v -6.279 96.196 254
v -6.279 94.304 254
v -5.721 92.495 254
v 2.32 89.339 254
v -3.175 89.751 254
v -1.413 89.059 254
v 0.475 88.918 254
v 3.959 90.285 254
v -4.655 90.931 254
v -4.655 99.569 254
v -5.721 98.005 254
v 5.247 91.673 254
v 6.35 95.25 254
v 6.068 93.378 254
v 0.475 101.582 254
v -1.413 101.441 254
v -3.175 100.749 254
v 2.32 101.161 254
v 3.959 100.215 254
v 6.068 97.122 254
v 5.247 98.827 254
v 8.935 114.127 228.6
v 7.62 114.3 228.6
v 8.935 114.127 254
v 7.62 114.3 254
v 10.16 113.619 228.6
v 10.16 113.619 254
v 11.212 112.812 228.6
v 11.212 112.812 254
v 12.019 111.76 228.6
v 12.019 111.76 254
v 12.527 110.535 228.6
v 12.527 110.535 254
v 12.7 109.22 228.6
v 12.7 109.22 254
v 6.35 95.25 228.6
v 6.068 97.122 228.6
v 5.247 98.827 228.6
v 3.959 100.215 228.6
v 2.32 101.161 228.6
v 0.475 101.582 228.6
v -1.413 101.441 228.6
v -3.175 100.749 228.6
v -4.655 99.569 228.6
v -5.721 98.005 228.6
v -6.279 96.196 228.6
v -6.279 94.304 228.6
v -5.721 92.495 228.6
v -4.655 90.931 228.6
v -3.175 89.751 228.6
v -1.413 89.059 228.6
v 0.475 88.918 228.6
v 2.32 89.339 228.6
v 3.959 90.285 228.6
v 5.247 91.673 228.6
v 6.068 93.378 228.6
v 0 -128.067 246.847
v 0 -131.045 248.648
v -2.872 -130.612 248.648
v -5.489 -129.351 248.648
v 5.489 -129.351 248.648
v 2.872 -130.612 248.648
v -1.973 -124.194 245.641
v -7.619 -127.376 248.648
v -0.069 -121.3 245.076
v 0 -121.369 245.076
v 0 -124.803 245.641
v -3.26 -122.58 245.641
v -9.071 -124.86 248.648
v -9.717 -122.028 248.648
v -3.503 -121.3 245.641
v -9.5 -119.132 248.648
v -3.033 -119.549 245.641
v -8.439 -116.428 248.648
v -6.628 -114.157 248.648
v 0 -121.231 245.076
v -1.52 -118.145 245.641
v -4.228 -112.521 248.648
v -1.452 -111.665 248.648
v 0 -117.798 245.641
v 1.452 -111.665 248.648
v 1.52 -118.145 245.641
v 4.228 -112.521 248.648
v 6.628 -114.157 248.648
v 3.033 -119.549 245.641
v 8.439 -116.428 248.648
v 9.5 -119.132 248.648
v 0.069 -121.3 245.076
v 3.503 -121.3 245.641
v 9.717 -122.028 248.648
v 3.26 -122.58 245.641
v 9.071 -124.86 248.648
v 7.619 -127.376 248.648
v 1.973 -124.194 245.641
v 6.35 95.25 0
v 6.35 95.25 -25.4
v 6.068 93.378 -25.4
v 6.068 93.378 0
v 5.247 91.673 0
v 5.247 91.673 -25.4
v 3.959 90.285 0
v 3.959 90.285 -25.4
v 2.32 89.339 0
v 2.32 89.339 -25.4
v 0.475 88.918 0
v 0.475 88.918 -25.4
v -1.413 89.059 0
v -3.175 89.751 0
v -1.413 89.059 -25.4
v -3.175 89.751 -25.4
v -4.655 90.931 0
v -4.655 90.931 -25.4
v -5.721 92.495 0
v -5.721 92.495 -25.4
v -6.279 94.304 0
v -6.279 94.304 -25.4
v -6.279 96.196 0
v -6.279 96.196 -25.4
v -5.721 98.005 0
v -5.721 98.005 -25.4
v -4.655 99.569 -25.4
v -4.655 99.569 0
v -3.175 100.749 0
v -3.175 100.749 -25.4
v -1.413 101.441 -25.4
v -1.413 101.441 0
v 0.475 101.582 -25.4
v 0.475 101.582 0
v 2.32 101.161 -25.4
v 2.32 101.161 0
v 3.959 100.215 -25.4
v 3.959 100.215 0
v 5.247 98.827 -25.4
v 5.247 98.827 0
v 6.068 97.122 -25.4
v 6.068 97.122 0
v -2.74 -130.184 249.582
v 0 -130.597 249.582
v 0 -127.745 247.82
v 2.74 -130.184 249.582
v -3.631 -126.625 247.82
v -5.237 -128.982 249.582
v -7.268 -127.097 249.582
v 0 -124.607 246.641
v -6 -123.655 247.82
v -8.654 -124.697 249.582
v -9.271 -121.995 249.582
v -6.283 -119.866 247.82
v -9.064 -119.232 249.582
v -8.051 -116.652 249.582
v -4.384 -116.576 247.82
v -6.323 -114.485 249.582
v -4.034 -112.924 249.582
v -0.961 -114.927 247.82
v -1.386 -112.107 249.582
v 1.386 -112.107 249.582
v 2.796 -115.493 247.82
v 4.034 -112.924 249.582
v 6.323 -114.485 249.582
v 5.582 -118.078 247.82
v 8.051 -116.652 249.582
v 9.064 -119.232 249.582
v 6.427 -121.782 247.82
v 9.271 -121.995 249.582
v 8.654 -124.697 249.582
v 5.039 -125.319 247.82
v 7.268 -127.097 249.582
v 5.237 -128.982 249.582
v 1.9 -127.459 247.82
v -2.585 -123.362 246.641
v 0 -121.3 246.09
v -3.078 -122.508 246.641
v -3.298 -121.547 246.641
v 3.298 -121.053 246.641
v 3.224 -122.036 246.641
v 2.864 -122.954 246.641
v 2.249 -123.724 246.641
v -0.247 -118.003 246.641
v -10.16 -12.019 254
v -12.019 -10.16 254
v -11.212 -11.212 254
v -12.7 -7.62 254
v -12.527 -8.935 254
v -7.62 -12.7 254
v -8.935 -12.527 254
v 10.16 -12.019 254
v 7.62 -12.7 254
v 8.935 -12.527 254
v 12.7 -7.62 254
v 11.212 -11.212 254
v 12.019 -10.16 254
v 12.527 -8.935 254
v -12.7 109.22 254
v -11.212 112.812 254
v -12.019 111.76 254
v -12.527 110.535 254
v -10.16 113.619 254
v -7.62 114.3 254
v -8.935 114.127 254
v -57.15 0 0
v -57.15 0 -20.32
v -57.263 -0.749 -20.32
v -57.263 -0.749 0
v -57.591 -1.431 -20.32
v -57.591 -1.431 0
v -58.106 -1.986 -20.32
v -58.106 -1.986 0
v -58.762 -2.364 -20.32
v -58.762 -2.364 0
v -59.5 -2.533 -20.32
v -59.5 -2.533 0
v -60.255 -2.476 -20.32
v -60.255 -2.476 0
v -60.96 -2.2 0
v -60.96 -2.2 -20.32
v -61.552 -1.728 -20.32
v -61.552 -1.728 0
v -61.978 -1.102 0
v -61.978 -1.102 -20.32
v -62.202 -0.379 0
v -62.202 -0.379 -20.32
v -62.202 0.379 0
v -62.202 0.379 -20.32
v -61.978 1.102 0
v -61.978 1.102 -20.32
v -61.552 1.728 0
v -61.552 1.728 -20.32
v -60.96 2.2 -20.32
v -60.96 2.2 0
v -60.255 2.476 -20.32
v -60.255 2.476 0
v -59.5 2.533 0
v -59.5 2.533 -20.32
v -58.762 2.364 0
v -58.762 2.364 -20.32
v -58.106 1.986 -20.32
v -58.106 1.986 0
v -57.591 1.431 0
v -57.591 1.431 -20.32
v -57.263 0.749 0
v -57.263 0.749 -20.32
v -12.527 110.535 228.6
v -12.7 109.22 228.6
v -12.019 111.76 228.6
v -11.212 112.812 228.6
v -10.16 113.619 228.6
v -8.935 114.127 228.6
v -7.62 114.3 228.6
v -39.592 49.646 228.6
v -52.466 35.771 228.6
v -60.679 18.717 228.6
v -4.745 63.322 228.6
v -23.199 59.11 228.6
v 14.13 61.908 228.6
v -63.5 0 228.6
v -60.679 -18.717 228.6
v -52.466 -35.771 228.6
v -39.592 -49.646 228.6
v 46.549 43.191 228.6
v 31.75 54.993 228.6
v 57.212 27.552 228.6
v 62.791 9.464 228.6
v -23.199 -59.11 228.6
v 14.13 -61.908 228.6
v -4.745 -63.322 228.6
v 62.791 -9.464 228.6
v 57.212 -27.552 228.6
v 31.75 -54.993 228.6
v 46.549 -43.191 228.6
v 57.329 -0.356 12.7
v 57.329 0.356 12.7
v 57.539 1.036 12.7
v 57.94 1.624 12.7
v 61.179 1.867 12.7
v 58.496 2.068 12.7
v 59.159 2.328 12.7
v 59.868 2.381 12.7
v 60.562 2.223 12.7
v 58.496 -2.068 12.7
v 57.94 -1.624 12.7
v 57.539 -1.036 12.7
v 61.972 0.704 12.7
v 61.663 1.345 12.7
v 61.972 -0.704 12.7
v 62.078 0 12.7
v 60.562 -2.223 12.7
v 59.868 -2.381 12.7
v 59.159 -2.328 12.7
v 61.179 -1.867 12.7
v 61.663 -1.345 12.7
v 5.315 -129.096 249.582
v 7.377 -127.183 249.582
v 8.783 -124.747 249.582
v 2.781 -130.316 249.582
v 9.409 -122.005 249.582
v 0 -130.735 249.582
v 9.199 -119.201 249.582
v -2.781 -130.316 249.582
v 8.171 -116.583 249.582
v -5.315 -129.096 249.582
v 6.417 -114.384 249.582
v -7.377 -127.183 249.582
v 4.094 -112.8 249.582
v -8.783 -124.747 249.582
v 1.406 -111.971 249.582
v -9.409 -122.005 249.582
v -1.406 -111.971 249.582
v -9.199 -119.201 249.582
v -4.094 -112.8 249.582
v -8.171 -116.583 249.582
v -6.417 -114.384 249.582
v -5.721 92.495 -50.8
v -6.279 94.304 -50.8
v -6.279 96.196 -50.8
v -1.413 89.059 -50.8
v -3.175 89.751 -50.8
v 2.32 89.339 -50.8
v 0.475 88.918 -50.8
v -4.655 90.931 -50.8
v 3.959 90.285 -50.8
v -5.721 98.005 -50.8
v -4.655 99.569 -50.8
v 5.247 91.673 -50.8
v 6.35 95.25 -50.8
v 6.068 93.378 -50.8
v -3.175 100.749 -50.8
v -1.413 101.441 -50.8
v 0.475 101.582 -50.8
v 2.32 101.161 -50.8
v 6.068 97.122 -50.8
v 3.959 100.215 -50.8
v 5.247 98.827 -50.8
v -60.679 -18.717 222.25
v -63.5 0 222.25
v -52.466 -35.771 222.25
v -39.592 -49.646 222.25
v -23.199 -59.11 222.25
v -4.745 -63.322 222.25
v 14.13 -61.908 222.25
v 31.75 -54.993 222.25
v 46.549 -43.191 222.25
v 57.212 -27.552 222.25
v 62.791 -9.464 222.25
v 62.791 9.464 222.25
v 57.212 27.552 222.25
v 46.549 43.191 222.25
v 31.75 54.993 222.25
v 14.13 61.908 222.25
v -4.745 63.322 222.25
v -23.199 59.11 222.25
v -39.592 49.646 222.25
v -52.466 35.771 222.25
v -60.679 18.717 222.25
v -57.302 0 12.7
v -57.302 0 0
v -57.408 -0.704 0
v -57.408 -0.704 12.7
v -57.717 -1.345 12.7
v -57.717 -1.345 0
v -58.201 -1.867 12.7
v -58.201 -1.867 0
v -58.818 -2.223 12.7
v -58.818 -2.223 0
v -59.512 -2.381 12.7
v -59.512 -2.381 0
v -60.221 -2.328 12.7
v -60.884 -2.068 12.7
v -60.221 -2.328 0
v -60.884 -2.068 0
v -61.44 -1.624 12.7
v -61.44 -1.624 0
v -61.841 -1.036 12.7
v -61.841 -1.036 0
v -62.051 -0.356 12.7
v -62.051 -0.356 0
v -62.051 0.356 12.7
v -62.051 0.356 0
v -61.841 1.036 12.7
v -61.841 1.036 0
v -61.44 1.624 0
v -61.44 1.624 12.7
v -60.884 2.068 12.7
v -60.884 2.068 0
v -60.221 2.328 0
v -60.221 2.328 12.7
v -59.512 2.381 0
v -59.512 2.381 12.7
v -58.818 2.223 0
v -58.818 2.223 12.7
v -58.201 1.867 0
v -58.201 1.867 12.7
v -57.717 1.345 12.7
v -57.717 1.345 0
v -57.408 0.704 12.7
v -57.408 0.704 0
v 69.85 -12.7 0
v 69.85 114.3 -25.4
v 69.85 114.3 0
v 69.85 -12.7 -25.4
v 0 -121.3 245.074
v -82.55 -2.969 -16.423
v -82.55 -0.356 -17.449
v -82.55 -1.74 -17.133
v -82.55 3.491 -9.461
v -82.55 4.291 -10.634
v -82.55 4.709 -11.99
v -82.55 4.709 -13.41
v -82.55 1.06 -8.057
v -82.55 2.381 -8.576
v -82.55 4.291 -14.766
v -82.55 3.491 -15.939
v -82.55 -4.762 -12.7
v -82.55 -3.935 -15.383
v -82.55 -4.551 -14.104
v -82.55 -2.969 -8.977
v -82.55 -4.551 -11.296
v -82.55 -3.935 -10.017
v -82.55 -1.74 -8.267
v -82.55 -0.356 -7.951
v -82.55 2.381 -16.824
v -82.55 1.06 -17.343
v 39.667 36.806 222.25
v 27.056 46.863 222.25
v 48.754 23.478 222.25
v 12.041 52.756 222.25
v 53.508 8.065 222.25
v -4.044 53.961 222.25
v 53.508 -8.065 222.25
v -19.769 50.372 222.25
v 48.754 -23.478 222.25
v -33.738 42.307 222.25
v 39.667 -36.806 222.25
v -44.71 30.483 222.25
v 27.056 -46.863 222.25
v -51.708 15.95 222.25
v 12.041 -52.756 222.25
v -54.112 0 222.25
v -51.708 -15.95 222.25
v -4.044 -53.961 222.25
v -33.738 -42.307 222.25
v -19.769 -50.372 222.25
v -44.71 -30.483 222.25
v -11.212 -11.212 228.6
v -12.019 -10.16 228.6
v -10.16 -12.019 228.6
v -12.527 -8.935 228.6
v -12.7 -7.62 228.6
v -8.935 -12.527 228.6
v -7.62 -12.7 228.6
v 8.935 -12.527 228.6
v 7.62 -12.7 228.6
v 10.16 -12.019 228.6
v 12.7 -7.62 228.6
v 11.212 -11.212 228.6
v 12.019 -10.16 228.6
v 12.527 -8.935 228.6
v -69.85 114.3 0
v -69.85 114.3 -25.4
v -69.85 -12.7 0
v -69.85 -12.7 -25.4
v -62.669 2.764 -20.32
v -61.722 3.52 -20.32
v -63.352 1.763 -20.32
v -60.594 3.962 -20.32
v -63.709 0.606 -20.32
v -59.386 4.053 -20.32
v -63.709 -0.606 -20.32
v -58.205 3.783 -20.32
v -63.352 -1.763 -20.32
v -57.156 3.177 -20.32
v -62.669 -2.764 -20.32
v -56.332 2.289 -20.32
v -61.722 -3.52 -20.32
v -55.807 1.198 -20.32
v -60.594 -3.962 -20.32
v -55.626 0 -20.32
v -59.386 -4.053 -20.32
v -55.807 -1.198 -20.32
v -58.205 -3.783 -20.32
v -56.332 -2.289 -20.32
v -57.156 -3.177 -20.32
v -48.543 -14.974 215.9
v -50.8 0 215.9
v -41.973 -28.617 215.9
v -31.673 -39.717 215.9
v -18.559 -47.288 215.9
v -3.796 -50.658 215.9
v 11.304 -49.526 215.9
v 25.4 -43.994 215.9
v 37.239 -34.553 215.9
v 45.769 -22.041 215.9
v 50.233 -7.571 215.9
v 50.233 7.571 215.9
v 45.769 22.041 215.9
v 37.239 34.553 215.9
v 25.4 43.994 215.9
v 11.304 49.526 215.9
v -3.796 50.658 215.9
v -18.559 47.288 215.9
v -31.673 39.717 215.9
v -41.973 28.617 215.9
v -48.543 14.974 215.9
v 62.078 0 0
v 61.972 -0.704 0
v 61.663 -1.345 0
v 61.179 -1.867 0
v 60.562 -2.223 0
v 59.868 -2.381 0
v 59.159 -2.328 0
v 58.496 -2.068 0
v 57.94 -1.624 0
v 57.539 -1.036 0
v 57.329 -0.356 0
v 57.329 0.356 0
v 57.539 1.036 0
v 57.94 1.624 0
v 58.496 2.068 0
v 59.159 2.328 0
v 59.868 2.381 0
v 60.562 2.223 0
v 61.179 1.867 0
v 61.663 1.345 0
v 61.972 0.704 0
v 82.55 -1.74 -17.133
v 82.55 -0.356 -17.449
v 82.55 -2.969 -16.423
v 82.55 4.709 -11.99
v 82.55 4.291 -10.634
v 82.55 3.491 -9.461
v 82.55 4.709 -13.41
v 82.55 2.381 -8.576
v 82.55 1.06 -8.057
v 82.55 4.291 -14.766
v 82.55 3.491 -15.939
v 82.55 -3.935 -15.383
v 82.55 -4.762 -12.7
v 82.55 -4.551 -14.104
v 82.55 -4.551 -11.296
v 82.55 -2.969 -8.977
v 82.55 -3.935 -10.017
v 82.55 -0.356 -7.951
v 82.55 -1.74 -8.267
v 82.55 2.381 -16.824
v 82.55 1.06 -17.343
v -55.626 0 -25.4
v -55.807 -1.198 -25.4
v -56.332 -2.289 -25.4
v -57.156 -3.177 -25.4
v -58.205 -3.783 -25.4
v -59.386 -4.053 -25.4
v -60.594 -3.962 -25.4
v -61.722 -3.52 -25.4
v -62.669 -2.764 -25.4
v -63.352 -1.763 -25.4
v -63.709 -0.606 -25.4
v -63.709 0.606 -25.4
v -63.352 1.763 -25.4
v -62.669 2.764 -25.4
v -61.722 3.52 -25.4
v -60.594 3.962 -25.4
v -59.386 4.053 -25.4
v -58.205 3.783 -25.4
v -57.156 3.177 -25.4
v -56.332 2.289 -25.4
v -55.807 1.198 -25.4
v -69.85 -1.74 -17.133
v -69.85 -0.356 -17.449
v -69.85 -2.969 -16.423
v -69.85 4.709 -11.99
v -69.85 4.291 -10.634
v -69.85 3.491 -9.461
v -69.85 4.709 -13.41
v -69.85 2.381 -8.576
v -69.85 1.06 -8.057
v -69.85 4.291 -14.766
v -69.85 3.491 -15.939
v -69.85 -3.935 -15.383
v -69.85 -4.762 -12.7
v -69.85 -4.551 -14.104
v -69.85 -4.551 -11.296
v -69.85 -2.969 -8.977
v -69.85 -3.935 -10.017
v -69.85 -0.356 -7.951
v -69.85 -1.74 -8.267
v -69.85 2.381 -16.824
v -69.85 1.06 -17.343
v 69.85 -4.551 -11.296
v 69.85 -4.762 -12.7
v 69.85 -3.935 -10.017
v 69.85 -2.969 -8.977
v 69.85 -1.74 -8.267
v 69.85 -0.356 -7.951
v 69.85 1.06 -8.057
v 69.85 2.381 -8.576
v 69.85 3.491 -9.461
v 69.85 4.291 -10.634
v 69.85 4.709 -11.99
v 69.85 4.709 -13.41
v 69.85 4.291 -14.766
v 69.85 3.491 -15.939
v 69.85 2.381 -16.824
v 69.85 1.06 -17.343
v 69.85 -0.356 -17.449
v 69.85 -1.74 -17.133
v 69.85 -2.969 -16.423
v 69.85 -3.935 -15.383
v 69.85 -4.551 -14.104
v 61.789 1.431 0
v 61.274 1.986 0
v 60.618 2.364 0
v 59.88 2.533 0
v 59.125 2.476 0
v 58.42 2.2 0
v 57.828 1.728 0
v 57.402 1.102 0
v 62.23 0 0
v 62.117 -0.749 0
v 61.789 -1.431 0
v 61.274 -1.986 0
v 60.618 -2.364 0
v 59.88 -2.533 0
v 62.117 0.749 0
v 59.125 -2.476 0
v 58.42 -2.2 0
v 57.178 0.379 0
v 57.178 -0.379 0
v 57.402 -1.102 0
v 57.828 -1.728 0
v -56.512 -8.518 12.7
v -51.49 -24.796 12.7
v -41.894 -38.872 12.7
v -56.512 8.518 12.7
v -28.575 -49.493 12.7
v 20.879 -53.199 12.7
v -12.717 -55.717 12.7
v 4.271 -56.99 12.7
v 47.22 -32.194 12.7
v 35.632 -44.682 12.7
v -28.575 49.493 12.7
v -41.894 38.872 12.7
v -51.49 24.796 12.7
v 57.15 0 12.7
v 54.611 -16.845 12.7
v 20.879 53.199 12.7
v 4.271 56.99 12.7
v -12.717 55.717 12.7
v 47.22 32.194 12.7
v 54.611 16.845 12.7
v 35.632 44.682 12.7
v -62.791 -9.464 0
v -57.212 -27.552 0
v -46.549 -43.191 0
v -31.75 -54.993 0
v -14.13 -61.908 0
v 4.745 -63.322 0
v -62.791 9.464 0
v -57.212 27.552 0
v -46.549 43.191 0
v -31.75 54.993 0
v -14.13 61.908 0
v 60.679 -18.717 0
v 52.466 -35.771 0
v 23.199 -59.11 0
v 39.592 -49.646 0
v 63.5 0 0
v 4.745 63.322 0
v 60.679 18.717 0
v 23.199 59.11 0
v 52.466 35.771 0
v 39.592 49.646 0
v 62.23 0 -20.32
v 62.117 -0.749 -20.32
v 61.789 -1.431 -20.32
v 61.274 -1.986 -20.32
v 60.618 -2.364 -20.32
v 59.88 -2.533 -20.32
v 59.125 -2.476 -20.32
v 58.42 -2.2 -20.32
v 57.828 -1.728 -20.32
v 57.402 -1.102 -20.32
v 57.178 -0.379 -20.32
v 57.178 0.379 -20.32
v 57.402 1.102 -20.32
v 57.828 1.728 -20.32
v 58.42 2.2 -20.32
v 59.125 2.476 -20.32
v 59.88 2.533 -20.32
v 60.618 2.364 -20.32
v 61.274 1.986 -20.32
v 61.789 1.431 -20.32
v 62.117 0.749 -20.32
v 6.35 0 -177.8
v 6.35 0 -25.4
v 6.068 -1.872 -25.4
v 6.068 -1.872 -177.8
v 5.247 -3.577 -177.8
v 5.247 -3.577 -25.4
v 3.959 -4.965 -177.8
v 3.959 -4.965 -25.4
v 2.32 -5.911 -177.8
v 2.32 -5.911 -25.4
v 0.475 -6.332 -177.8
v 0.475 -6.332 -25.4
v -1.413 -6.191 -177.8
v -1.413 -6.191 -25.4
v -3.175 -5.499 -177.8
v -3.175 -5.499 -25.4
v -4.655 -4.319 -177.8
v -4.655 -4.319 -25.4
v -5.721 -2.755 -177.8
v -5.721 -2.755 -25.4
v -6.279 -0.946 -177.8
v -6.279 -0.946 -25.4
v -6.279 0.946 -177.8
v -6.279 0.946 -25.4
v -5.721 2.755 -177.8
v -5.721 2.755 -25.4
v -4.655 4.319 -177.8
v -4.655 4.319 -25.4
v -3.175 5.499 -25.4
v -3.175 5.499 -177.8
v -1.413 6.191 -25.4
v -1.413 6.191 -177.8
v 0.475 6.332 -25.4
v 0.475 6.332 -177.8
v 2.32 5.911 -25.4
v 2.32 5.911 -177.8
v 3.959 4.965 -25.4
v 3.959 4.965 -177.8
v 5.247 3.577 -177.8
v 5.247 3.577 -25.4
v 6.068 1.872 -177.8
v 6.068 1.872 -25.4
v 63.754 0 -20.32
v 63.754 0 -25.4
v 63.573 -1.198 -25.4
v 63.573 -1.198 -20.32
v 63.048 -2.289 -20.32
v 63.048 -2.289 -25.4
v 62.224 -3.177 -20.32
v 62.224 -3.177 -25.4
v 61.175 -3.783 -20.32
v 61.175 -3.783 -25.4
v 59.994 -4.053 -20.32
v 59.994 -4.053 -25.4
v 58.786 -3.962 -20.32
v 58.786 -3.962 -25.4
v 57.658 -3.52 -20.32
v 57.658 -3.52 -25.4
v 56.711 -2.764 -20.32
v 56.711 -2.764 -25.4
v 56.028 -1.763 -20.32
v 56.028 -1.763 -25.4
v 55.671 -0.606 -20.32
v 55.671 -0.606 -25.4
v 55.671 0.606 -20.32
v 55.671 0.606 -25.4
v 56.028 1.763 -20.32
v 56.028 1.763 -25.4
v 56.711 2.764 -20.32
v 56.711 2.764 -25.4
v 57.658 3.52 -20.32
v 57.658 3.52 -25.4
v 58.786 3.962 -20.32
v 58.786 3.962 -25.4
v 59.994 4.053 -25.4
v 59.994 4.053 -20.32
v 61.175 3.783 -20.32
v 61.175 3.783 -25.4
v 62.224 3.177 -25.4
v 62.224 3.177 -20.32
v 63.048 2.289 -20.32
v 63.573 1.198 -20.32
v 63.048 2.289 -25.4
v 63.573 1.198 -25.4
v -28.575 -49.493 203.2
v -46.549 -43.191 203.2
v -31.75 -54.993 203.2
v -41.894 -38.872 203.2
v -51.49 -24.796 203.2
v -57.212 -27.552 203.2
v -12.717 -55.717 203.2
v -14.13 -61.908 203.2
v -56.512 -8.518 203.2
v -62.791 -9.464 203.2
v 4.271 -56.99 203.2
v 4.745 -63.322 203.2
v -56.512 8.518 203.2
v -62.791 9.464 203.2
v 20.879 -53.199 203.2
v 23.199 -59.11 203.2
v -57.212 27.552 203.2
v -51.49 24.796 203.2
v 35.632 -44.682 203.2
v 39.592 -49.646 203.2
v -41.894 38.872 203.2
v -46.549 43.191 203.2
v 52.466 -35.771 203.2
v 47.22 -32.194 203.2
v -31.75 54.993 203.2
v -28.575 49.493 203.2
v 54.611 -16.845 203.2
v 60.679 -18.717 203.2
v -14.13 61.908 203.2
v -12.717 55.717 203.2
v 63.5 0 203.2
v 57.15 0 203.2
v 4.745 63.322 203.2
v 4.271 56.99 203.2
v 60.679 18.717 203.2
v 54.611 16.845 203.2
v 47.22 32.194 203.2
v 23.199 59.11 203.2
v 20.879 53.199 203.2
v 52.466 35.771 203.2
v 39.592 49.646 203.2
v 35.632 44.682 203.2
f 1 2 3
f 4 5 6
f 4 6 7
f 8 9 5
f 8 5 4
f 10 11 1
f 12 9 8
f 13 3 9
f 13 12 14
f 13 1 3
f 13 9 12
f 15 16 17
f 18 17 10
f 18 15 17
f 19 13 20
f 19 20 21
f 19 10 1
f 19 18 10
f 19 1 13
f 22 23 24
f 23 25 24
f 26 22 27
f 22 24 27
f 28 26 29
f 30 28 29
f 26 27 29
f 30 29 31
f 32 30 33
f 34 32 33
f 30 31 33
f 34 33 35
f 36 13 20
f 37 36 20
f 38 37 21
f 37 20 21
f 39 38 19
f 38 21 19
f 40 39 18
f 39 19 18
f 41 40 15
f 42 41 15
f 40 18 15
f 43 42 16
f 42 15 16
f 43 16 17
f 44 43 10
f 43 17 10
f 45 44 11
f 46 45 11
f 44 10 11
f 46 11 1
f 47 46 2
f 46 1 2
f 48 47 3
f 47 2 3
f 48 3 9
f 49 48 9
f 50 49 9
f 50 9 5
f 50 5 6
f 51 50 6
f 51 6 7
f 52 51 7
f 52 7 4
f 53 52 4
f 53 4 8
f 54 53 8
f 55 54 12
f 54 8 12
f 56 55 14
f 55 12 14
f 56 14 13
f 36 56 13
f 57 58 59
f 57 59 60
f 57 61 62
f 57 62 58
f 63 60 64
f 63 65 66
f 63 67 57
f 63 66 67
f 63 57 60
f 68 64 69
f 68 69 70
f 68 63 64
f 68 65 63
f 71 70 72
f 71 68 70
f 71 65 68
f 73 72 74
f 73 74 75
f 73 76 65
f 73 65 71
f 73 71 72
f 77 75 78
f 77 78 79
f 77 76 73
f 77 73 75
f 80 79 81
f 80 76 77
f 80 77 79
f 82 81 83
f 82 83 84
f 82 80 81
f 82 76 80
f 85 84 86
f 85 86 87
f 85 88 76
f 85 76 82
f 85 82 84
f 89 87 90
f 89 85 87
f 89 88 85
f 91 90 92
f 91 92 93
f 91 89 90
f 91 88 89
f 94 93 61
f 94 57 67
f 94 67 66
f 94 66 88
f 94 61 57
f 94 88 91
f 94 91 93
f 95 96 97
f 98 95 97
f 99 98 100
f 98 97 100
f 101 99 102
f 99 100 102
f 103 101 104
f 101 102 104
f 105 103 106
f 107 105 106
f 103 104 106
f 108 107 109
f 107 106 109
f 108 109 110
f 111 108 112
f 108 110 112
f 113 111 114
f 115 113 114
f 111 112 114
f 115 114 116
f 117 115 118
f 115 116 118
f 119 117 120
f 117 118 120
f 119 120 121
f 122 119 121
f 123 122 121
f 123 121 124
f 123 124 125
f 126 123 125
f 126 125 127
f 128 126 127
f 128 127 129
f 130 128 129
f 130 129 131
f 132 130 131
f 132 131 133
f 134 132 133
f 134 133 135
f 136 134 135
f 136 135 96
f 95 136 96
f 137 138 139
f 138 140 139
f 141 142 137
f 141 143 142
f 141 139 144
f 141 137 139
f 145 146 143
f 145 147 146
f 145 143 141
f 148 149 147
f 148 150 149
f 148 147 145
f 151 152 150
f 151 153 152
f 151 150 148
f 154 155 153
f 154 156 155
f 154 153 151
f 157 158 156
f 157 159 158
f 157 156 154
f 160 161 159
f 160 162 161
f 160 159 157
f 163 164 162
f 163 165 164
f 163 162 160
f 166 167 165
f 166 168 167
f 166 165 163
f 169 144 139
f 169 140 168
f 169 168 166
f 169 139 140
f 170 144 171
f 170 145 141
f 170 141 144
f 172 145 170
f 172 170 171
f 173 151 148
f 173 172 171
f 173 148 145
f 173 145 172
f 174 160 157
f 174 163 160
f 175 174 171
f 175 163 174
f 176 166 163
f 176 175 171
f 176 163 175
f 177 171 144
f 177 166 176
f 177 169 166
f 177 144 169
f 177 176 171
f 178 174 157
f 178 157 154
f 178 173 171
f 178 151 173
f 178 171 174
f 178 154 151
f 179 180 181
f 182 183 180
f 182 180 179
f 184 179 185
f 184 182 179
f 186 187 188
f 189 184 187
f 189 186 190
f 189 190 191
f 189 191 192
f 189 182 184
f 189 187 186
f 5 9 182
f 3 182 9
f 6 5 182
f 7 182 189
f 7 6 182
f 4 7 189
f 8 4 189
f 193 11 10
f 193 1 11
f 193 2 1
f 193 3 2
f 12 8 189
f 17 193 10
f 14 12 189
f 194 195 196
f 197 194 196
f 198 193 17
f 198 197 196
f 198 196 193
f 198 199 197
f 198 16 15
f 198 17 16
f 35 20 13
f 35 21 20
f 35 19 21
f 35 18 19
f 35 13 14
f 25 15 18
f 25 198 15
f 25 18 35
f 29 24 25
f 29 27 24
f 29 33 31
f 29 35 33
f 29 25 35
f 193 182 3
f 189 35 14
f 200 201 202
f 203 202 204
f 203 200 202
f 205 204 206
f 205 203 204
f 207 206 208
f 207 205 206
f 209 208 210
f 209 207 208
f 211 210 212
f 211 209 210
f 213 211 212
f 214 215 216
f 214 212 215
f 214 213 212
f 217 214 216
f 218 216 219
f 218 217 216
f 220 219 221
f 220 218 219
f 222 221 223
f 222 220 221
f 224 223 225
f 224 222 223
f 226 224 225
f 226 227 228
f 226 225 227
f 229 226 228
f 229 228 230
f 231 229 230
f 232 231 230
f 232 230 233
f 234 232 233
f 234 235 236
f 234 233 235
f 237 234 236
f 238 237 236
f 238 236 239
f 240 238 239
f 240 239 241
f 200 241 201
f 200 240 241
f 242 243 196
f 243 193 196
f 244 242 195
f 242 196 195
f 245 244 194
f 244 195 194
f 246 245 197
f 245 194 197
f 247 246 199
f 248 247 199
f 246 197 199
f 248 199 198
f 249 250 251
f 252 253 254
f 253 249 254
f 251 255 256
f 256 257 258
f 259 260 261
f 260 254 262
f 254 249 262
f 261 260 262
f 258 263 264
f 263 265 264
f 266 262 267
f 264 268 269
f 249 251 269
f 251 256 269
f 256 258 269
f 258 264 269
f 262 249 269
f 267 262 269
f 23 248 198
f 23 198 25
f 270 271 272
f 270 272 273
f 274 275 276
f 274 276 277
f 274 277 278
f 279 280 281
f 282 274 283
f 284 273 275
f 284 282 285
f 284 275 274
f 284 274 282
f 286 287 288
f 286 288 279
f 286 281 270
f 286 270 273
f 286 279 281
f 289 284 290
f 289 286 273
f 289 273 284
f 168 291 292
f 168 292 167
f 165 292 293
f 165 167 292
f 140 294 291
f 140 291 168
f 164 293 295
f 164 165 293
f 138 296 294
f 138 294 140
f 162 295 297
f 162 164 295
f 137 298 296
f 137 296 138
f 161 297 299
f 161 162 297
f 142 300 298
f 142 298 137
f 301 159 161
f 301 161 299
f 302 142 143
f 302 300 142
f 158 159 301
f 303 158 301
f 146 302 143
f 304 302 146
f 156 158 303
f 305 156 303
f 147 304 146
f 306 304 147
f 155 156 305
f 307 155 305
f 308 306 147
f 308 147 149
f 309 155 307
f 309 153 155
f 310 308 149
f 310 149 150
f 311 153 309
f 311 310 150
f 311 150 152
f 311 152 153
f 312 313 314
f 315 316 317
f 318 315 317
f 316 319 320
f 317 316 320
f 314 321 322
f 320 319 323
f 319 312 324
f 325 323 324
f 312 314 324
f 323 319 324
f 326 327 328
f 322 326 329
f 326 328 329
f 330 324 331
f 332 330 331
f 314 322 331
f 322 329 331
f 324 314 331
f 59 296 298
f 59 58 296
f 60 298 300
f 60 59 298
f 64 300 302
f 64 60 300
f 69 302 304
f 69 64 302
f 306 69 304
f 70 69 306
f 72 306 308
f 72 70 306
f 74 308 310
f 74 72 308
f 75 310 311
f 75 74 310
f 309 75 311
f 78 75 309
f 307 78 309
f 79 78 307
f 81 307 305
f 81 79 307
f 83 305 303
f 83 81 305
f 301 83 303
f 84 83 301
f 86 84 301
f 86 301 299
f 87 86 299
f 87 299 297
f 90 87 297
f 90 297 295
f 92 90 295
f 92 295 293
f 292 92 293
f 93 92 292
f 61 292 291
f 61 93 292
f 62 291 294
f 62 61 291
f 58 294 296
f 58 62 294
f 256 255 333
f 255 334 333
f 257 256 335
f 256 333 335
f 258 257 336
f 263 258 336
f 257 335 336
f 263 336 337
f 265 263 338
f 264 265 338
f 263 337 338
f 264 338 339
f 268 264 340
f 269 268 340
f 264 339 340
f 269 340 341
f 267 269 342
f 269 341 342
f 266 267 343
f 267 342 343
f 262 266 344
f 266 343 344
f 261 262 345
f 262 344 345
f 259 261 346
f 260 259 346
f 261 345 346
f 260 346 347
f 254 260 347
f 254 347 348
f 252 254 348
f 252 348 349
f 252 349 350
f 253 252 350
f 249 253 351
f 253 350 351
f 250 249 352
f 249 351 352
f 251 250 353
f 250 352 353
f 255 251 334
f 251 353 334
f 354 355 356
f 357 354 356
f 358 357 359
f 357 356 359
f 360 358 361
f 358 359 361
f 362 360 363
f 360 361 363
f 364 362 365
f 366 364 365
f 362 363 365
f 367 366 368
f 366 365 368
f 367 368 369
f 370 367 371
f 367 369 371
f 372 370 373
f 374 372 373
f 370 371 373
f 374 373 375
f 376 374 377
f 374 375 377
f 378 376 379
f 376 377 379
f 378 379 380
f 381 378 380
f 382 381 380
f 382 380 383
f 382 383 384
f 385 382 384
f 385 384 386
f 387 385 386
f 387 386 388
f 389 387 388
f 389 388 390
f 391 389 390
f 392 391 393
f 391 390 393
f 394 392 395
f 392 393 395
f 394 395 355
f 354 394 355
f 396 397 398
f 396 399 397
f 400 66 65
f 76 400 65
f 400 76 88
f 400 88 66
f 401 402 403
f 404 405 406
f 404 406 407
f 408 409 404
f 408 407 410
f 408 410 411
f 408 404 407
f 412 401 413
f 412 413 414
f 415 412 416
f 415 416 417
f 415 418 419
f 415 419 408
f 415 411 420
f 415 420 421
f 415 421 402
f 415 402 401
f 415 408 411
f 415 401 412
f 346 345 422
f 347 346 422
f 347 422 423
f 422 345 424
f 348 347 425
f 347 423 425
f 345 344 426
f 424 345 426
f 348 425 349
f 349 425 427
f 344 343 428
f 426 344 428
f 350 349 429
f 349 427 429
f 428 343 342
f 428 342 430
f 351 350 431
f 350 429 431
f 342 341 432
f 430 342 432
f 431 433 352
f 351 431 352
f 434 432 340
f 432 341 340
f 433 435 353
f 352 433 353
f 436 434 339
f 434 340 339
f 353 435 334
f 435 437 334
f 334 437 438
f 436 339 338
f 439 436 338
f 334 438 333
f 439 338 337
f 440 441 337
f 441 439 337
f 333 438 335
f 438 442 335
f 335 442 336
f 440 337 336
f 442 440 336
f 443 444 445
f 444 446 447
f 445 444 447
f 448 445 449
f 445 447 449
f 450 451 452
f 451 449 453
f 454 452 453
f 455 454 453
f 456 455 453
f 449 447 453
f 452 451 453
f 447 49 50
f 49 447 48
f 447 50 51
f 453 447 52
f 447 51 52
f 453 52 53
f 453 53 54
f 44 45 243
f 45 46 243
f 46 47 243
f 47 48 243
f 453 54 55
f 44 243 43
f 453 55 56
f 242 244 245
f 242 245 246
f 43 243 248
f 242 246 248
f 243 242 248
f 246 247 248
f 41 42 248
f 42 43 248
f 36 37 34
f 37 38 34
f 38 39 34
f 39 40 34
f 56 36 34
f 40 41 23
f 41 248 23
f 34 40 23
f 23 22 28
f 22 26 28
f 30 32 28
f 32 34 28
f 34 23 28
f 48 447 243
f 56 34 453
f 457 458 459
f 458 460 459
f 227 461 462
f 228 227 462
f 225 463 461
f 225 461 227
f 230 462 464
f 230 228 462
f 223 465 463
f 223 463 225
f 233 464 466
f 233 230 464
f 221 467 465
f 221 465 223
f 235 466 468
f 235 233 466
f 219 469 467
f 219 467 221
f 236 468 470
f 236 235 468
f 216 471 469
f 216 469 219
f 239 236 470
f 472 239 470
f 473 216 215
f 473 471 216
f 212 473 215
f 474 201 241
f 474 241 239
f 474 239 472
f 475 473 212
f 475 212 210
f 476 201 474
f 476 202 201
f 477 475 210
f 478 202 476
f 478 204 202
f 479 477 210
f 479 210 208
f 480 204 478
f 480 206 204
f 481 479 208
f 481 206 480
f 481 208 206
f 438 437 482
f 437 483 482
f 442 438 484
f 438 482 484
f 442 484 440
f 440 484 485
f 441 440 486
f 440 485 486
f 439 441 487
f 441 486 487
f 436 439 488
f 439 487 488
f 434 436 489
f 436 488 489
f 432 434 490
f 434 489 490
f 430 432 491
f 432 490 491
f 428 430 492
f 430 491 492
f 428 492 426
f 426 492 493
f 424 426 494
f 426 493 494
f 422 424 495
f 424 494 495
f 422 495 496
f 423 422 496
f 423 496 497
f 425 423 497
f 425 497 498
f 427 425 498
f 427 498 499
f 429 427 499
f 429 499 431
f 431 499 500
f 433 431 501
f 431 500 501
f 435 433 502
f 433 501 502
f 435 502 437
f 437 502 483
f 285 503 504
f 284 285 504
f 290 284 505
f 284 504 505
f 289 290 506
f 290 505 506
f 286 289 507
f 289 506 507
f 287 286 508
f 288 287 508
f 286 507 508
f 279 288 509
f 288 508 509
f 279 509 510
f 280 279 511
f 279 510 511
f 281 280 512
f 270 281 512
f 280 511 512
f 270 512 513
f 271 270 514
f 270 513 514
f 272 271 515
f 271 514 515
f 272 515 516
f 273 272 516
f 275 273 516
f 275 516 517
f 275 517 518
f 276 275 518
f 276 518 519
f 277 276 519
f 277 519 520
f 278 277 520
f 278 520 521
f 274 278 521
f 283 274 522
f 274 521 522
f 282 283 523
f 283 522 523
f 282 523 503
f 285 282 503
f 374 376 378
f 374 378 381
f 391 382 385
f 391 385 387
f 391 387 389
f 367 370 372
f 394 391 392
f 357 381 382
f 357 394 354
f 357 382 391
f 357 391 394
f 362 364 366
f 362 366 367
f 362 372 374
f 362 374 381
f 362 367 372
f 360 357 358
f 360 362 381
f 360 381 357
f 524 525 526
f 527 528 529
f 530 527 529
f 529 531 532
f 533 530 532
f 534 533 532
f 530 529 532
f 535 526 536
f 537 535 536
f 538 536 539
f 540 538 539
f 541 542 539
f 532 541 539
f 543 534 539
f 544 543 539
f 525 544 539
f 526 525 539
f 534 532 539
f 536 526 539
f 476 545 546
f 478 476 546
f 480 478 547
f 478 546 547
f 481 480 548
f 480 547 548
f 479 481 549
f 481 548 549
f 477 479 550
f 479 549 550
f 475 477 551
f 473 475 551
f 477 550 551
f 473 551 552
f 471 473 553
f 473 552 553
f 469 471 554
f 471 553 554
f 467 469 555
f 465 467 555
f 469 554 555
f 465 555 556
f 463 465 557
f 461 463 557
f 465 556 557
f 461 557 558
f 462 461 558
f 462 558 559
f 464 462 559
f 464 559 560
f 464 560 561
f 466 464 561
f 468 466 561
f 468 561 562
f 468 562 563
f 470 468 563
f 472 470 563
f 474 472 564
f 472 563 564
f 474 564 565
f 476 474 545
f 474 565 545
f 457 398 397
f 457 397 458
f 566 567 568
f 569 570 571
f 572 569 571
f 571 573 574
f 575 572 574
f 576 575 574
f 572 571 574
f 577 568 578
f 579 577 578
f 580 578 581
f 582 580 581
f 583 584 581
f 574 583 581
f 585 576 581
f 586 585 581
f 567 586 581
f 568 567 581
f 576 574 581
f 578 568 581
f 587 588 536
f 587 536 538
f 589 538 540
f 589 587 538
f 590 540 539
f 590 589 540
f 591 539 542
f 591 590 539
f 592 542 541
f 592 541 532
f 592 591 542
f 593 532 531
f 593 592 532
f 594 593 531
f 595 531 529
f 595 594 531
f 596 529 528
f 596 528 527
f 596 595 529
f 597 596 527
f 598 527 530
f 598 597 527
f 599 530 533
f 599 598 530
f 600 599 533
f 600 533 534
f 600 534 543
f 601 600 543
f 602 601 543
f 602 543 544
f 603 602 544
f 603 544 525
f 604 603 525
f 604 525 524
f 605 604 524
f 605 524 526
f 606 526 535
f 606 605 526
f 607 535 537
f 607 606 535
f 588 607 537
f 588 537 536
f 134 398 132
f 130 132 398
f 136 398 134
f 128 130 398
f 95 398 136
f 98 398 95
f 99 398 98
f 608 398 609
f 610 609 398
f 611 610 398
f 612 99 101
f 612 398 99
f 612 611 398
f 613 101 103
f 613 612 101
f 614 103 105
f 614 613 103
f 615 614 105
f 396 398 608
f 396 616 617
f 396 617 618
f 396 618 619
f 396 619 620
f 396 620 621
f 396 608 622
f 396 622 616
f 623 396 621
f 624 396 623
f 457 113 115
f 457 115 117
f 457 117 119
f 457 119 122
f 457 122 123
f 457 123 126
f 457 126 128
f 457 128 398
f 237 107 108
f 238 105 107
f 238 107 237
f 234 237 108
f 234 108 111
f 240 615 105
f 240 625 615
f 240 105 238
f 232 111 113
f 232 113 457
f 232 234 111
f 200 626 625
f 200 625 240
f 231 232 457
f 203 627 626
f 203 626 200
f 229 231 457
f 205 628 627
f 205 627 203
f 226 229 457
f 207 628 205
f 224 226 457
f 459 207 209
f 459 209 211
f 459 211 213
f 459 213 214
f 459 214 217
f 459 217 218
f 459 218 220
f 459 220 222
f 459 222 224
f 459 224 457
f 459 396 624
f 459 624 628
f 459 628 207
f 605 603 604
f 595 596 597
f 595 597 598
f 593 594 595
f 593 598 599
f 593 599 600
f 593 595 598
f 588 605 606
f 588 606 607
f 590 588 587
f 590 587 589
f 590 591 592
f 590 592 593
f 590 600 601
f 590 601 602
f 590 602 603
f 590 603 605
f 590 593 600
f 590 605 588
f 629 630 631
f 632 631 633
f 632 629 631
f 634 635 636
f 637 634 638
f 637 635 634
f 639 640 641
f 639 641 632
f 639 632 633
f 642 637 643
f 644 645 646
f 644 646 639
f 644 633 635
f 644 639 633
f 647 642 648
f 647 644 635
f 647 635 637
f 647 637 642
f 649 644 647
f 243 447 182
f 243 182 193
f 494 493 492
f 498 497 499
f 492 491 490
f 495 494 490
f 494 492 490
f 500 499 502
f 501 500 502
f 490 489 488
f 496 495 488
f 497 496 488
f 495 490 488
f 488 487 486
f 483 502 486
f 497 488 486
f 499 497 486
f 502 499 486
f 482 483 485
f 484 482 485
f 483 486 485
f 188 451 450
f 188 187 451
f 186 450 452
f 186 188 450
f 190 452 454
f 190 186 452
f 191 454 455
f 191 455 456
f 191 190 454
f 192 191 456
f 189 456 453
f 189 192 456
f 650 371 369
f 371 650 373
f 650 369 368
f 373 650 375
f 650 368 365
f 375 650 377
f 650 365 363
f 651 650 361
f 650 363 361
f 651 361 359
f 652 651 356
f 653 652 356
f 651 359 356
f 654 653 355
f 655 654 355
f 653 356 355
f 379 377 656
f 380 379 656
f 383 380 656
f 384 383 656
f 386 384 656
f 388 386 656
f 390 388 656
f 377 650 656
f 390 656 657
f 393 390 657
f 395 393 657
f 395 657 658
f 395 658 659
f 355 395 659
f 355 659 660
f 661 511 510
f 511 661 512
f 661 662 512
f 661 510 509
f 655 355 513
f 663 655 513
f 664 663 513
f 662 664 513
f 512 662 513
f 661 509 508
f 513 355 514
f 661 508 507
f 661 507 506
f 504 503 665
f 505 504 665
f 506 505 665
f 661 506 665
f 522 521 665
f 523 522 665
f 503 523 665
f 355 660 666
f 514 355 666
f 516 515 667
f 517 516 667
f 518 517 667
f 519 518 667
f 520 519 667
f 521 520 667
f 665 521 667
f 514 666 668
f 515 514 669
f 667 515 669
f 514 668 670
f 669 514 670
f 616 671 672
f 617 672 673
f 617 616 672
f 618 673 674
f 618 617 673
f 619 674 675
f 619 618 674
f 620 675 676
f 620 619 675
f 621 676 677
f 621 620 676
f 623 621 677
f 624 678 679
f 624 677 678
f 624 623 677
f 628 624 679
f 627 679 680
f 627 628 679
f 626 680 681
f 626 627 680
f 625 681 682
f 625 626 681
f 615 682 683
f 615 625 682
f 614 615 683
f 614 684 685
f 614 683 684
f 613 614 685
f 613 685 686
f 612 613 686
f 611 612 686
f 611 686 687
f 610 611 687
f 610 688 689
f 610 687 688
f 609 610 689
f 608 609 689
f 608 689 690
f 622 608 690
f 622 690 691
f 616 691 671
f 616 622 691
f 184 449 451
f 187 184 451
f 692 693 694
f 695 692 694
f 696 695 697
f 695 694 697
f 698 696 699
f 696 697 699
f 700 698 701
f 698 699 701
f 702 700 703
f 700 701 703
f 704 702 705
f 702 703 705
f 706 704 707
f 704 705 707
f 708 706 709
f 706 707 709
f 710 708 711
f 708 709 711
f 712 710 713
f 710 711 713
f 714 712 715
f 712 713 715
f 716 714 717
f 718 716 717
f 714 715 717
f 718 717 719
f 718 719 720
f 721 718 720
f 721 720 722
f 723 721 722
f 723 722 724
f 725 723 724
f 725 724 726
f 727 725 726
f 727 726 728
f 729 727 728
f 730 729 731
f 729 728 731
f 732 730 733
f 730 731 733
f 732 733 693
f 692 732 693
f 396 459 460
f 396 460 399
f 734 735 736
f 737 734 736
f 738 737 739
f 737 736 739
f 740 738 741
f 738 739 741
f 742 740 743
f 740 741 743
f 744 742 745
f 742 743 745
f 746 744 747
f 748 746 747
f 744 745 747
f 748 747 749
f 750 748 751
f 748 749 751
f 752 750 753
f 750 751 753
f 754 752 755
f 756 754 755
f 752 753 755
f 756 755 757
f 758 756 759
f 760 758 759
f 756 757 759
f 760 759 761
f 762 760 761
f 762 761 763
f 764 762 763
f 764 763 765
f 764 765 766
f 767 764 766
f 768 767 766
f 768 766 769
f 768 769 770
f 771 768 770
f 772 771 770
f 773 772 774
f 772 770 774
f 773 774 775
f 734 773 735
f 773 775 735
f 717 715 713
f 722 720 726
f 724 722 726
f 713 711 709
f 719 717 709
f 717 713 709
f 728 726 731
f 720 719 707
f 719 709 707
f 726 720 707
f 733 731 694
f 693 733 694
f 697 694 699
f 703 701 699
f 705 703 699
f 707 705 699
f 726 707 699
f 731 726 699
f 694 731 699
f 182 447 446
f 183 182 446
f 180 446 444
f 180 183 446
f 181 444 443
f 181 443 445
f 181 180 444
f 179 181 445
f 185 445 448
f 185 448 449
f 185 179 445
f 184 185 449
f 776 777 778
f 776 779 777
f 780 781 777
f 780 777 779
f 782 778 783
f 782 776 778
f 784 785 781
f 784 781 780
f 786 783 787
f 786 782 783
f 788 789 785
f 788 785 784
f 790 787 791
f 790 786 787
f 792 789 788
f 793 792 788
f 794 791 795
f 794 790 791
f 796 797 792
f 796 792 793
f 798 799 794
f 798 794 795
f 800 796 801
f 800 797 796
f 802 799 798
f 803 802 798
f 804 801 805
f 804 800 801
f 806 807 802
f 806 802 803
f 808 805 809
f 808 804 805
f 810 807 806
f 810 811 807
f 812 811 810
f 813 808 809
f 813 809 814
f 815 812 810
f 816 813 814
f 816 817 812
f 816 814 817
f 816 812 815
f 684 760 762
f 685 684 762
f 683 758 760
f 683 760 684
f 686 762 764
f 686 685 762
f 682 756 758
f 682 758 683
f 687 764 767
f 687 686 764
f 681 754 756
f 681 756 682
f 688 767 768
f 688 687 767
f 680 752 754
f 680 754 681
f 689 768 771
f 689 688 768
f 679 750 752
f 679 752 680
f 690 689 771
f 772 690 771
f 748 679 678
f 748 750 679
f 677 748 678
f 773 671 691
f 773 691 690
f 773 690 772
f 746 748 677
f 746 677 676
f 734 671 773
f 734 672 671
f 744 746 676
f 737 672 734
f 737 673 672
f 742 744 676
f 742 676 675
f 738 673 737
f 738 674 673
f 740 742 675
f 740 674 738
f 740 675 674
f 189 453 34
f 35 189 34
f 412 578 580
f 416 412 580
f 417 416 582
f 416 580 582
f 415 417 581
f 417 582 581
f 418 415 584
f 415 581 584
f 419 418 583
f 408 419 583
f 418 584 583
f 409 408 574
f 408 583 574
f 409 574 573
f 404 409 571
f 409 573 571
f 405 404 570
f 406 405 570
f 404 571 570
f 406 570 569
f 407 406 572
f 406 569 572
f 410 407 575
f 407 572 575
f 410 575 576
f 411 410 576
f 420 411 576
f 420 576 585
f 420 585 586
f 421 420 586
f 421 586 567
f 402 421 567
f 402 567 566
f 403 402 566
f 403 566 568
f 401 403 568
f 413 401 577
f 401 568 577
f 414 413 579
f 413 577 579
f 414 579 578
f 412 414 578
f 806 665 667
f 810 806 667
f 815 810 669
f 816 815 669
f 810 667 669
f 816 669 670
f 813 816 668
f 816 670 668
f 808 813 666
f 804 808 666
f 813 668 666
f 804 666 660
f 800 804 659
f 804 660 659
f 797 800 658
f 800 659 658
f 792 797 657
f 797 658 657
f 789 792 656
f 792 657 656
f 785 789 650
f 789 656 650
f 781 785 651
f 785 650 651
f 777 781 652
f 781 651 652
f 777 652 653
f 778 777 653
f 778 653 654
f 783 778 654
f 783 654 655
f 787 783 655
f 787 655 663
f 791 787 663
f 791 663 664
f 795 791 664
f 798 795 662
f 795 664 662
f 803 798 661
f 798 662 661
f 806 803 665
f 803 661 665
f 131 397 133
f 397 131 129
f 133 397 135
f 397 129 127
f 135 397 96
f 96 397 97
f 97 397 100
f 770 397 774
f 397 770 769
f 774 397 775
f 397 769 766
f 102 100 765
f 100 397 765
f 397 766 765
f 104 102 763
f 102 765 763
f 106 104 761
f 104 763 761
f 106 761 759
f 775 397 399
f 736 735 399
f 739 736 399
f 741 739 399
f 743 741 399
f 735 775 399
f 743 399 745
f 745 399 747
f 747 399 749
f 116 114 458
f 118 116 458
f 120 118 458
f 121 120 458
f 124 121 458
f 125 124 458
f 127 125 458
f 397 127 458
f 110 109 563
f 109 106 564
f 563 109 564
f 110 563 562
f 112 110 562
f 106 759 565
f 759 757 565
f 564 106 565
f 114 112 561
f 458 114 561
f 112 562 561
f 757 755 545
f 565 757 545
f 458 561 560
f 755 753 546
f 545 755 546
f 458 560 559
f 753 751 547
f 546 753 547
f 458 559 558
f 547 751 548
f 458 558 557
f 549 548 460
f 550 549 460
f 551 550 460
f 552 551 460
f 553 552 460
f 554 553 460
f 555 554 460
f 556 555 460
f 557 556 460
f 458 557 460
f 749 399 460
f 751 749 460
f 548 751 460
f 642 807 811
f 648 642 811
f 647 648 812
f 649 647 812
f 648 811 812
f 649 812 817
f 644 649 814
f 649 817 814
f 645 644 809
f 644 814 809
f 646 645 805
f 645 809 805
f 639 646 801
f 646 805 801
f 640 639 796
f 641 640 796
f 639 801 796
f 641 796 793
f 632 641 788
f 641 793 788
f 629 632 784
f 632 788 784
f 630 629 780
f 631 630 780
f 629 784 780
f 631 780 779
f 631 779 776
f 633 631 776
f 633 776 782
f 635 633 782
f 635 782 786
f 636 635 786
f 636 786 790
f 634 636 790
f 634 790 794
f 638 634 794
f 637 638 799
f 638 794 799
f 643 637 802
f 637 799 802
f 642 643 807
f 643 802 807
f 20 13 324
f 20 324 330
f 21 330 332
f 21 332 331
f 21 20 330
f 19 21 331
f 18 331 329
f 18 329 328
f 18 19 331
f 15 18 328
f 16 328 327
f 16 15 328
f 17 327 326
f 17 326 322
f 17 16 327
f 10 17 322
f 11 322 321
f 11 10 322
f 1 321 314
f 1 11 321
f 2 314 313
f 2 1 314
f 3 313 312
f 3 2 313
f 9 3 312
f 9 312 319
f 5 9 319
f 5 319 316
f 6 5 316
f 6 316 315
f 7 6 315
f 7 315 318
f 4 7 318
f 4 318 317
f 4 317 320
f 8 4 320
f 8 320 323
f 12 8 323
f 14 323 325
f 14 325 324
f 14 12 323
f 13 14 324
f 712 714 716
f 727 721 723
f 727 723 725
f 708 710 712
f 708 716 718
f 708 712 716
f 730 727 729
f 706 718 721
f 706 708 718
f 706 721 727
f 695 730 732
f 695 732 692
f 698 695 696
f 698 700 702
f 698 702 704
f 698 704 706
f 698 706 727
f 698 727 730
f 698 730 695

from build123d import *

# Parameters (mm, degrees)
F0_R      = 63.5
F1_DEPTH  = 203.2
F2_R      = 57.15
F3_DEPTH  = 190.5
F7_R      = 2.3876
F8_DEPTH  = 12.7
F9_W      = 139.7
F9_H      = 25.4
F9_R      = 2.54
F10_DEPTH = 25.4
F11_R     = 4.064
F12_DEPTH = 5.08
F14_R     = 6.35
F15_DEPTH = 152.4
F16_W     = 25.4
F16_H     = 127
F17_DEPTH = 25.4
F18_R     = 6.35
F19_DEPTH = 25.4
F20_R     = 6.35
F21_DEPTH = 304.8
F22_R     = 5.08
F23_W     = 139.7
F23_H     = 25.4
F24_DEPTH = 101.6
F25_R     = 6.35
F26_DEPTH = 279.401
F13_R     = 4.7625
F29_DEPTH = 12.7


with BuildPart() as f1:
    # F0 (on Top) → F1 (new body)
    with BuildSketch(Plane.XY):
        Circle(F0_R)
    extrude(amount=F1_DEPTH)

    # F2 (on face) → F3 (cut)
    with BuildSketch(Plane.XY.offset(203.2)):
        Circle(F2_R)
    extrude(amount=-F3_DEPTH, mode=Mode.SUBTRACT)

    # F7 (on face) → F8 (cut)
    with BuildSketch(Plane(origin=(0, 0, 0), x_dir=(1, 0, 0), z_dir=(0, 0, -1))):
        with Locations((-59.69, 0)):
            Circle(F7_R)
        with Locations((59.69, 0)):
            Circle(F7_R)
    extrude(amount=-F8_DEPTH, mode=Mode.SUBTRACT)


with BuildPart() as f6:
    # F5 (on Front) → F6 (revolve)
    with BuildSketch(Plane.XZ):
        Polygon((0, 215.9), (0, 228.6), (-63.5, 228.6), (-63.5, 222.25), (-54.1123329857, 222.25), (-50.8, 215.9), align=None)
    revolve(axis=Axis((0, 0, 222.25), (0, 0, 1)))


with BuildPart() as f10:
    # F9 (on face) → F10 (new body)
    with BuildSketch(Plane(origin=(0, 0, 0), x_dir=(1, 0, 0), z_dir=(0, 0, -1))):
        Rectangle(F9_W, F9_H)
        with Locations((-59.69, 0)):
            Circle(F9_R, mode=Mode.SUBTRACT)
        with Locations((59.69, 0)):
            Circle(F9_R, mode=Mode.SUBTRACT)
    extrude(amount=F10_DEPTH)

    # F11 (on face) → F12 (cut)
    with BuildSketch(Plane(origin=(0, 0, -25.4), x_dir=(1, 0, 0), z_dir=(0, 0, -1))):
        with Locations((-59.69, 0)):
            Circle(F11_R)
        with Locations((59.69, 0)):
            Circle(F11_R)
    extrude(amount=-F12_DEPTH, mode=Mode.SUBTRACT)

    # F23 (on face) → F24 (join)
    with BuildSketch(Plane(origin=(0, 12.7, 0), x_dir=(-1, 0, 0), z_dir=(0, 1, 0))):
        with Locations((0, -12.7)):
            Rectangle(F23_W, F23_H)
    extrude(amount=F24_DEPTH)

    # F25 (on face) → F26 (cut, through all)
    with BuildSketch(Plane(origin=(0, 0, -25.4), x_dir=(1, 0, 0), z_dir=(0, 0, -1))):
        with Locations((0, -95.25)):
            Circle(F25_R)
    extrude(amount=-F26_DEPTH, mode=Mode.SUBTRACT)


with BuildPart() as f15:
    # F14 (on face) → F15 (new body)
    with BuildSketch(Plane(origin=(0, 0, -25.4), x_dir=(1, 0, 0), z_dir=(0, 0, -1))):
        Circle(F14_R)
    extrude(amount=F15_DEPTH)


with BuildPart() as f17:
    # F16 (on face) → F17 (new body)
    with BuildSketch(Plane.XY.offset(228.6)):
        with Locations((0, 50.8)):
            Rectangle(F16_W, F16_H)
    extrude(amount=F17_DEPTH)

    # F18 (on face) → F19 (cut)
    with BuildSketch(Plane.XY.offset(254)):
        with Locations((0, 95.25)):
            Circle(F18_R)
    extrude(amount=-F19_DEPTH, mode=Mode.SUBTRACT)

    # F22
    f22_edges = [f17.edges().sort_by_distance(p)[0] for p in [
        (-12.7, -12.7, 241.3),
        (12.7, -12.7, 241.3),
        (12.7, 114.3, 241.3),
        (-12.7, 114.3, 241.3),
    ]]
    fillet(f22_edges, radius=F22_R)


with BuildPart() as f21:
    # F20 (on offset) → F21 (new body)
    with BuildSketch(Plane.XY.offset(254)):
        with Locations((0, 95.25)):
            Circle(F20_R)
    extrude(amount=-F21_DEPTH)


with BuildPart() as f28:
    # F27 (on Right) → F28 (revolve)
    with BuildSketch(Plane.YZ):
        with BuildLine():
            Line((-121.3002428412, 245.0738400221), (-121.3002428412, 246.0898400221))
            ThreePointArc((-121.3002428412, 246.0898400221), (-126.2048455265, 247.1539878791), (-130.5969267216, 249.5823949575))
            Line((-130.5969267216, 249.5823949575), (-130.7353358137, 249.5823949575))
            Line((-130.7353358137, 249.5823949575), (-131.0446783728, 248.6478379131))
            ThreePointArc((-131.0446783728, 248.6478379131), (-126.4637875903, 246.1662578068), (-121.3692276655, 245.0761847089))
            Line((-121.3692276655, 245.0761847089), (-121.3002428412, 245.0738400221))
        make_face()
    revolve(axis=Axis((0, -121.3002428412, 245.5818400221), (0, 0, -1)))


with BuildPart() as f29:
    # F13 (on face) → F29 (new body)
    with BuildSketch(Plane(origin=(-69.85, 0, 0), x_dir=(0, -1, 0), z_dir=(-1, 0, 0))):
        with Locations((0, -12.7)):
            Circle(F13_R)
    extrude(amount=F29_DEPTH)


with BuildPart() as f30_1:
    # F30: instance of F29
    add(f29.part.mirror(Plane.YZ))


solid = Compound([f1.part, f6.part, f10.part, f15.part, f17.part, f21.part, f28.part, f29.part, f30_1.part])
